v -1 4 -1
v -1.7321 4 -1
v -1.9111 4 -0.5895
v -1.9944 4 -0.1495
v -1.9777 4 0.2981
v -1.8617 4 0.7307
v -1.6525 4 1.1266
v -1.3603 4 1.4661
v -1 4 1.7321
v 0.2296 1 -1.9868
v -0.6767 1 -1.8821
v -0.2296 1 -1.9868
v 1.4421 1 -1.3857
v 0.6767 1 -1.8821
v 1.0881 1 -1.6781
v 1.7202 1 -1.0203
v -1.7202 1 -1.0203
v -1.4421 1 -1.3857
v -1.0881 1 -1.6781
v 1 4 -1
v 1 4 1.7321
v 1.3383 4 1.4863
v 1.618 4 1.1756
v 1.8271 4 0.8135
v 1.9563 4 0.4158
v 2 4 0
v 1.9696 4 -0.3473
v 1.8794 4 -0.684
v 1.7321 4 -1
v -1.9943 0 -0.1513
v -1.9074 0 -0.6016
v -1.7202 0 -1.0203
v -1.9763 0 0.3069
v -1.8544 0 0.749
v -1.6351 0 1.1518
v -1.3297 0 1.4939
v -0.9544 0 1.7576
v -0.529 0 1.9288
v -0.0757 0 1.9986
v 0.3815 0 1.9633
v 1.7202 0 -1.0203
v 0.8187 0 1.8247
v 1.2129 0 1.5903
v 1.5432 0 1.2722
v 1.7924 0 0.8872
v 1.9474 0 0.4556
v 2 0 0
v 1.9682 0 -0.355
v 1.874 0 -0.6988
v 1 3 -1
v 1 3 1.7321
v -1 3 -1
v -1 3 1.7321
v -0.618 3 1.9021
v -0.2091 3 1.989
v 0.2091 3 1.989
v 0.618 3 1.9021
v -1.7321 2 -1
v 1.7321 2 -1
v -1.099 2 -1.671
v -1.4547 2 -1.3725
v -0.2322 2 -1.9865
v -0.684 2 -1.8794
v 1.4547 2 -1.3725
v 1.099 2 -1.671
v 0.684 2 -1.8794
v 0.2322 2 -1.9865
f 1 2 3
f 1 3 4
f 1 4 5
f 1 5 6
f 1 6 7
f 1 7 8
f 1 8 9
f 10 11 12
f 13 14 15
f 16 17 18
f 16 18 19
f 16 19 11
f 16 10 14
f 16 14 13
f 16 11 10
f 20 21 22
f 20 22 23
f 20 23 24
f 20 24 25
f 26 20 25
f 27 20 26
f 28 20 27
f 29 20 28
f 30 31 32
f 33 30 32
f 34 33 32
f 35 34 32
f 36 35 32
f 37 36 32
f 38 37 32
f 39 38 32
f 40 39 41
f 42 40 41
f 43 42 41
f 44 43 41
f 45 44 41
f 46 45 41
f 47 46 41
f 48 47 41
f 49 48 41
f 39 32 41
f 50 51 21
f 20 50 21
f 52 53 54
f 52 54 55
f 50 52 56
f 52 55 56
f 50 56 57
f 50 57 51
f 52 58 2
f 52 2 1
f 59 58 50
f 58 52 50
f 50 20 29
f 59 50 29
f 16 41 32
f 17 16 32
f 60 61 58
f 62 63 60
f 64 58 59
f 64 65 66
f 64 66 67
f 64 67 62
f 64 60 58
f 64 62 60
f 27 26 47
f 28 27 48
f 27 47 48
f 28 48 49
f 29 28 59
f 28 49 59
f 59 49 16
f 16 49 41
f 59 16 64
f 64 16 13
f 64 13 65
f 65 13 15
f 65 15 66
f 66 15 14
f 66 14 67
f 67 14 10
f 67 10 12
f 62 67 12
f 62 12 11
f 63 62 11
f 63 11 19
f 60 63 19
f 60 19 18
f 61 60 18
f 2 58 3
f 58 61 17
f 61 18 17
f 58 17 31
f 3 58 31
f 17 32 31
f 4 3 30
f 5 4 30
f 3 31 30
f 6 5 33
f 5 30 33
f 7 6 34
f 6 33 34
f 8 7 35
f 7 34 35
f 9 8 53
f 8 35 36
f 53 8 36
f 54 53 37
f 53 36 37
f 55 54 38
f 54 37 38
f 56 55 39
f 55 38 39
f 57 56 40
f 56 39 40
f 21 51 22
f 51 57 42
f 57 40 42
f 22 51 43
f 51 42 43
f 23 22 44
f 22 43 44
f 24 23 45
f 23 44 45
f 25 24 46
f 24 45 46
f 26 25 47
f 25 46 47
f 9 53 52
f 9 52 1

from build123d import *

# Parameters (mm, degrees)
SKETCH1_R           = 2
BOSS_EXTRUDE1_DEPTH = 4
SKETCH2_W           = 2
SKETCH2_H           = 1
CUT_EXTRUDE1_DEPTH  = 5
CUT_EXTRUDE2_DEPTH  = 2
CUT_EXTRUDE3_DEPTH  = 1


with BuildPart() as part:
    # Sketch1 → Boss-Extrude1 (new body)
    with BuildSketch(Plane(origin=(0, 0, 0), x_dir=(1, 0, 0), z_dir=(0, 1, 0))):
        Circle(SKETCH1_R)
    extrude(amount=BOSS_EXTRUDE1_DEPTH)

    # Sketch2 → Cut-Extrude1 (cut, symmetric)
    with BuildSketch(Plane.XY):
        with Locations((0, 3.5)):
            Rectangle(SKETCH2_W, SKETCH2_H)
    extrude(amount=CUT_EXTRUDE1_DEPTH, both=True, mode=Mode.SUBTRACT)

    # Sketch3 → Cut-Extrude2 (cut)
    with BuildSketch(Plane(origin=(0, 4, 0), x_dir=(1, 0, 0), z_dir=(0, 1, 0))):
        with BuildLine():
            Line((-1.732050808, 1), (1.732050808, 1))
            ThreePointArc((1.732050808, 1), (0, 2), (-1.732050808, 1))
        make_face()
    extrude(amount=-CUT_EXTRUDE2_DEPTH, mode=Mode.SUBTRACT)

    # Sketch4 → Cut-Extrude3 (cut)
    with BuildSketch(Plane.XZ):
        with BuildLine():
            Line((1.720168713, -1.020303679), (-1.720168713, -1.020303679))
            ThreePointArc((-1.720168713, -1.020303679), (0, -2.010022353), (1.720168713, -1.020303679))
        make_face()
    extrude(amount=-CUT_EXTRUDE3_DEPTH, mode=Mode.SUBTRACT)


solid = part.part
